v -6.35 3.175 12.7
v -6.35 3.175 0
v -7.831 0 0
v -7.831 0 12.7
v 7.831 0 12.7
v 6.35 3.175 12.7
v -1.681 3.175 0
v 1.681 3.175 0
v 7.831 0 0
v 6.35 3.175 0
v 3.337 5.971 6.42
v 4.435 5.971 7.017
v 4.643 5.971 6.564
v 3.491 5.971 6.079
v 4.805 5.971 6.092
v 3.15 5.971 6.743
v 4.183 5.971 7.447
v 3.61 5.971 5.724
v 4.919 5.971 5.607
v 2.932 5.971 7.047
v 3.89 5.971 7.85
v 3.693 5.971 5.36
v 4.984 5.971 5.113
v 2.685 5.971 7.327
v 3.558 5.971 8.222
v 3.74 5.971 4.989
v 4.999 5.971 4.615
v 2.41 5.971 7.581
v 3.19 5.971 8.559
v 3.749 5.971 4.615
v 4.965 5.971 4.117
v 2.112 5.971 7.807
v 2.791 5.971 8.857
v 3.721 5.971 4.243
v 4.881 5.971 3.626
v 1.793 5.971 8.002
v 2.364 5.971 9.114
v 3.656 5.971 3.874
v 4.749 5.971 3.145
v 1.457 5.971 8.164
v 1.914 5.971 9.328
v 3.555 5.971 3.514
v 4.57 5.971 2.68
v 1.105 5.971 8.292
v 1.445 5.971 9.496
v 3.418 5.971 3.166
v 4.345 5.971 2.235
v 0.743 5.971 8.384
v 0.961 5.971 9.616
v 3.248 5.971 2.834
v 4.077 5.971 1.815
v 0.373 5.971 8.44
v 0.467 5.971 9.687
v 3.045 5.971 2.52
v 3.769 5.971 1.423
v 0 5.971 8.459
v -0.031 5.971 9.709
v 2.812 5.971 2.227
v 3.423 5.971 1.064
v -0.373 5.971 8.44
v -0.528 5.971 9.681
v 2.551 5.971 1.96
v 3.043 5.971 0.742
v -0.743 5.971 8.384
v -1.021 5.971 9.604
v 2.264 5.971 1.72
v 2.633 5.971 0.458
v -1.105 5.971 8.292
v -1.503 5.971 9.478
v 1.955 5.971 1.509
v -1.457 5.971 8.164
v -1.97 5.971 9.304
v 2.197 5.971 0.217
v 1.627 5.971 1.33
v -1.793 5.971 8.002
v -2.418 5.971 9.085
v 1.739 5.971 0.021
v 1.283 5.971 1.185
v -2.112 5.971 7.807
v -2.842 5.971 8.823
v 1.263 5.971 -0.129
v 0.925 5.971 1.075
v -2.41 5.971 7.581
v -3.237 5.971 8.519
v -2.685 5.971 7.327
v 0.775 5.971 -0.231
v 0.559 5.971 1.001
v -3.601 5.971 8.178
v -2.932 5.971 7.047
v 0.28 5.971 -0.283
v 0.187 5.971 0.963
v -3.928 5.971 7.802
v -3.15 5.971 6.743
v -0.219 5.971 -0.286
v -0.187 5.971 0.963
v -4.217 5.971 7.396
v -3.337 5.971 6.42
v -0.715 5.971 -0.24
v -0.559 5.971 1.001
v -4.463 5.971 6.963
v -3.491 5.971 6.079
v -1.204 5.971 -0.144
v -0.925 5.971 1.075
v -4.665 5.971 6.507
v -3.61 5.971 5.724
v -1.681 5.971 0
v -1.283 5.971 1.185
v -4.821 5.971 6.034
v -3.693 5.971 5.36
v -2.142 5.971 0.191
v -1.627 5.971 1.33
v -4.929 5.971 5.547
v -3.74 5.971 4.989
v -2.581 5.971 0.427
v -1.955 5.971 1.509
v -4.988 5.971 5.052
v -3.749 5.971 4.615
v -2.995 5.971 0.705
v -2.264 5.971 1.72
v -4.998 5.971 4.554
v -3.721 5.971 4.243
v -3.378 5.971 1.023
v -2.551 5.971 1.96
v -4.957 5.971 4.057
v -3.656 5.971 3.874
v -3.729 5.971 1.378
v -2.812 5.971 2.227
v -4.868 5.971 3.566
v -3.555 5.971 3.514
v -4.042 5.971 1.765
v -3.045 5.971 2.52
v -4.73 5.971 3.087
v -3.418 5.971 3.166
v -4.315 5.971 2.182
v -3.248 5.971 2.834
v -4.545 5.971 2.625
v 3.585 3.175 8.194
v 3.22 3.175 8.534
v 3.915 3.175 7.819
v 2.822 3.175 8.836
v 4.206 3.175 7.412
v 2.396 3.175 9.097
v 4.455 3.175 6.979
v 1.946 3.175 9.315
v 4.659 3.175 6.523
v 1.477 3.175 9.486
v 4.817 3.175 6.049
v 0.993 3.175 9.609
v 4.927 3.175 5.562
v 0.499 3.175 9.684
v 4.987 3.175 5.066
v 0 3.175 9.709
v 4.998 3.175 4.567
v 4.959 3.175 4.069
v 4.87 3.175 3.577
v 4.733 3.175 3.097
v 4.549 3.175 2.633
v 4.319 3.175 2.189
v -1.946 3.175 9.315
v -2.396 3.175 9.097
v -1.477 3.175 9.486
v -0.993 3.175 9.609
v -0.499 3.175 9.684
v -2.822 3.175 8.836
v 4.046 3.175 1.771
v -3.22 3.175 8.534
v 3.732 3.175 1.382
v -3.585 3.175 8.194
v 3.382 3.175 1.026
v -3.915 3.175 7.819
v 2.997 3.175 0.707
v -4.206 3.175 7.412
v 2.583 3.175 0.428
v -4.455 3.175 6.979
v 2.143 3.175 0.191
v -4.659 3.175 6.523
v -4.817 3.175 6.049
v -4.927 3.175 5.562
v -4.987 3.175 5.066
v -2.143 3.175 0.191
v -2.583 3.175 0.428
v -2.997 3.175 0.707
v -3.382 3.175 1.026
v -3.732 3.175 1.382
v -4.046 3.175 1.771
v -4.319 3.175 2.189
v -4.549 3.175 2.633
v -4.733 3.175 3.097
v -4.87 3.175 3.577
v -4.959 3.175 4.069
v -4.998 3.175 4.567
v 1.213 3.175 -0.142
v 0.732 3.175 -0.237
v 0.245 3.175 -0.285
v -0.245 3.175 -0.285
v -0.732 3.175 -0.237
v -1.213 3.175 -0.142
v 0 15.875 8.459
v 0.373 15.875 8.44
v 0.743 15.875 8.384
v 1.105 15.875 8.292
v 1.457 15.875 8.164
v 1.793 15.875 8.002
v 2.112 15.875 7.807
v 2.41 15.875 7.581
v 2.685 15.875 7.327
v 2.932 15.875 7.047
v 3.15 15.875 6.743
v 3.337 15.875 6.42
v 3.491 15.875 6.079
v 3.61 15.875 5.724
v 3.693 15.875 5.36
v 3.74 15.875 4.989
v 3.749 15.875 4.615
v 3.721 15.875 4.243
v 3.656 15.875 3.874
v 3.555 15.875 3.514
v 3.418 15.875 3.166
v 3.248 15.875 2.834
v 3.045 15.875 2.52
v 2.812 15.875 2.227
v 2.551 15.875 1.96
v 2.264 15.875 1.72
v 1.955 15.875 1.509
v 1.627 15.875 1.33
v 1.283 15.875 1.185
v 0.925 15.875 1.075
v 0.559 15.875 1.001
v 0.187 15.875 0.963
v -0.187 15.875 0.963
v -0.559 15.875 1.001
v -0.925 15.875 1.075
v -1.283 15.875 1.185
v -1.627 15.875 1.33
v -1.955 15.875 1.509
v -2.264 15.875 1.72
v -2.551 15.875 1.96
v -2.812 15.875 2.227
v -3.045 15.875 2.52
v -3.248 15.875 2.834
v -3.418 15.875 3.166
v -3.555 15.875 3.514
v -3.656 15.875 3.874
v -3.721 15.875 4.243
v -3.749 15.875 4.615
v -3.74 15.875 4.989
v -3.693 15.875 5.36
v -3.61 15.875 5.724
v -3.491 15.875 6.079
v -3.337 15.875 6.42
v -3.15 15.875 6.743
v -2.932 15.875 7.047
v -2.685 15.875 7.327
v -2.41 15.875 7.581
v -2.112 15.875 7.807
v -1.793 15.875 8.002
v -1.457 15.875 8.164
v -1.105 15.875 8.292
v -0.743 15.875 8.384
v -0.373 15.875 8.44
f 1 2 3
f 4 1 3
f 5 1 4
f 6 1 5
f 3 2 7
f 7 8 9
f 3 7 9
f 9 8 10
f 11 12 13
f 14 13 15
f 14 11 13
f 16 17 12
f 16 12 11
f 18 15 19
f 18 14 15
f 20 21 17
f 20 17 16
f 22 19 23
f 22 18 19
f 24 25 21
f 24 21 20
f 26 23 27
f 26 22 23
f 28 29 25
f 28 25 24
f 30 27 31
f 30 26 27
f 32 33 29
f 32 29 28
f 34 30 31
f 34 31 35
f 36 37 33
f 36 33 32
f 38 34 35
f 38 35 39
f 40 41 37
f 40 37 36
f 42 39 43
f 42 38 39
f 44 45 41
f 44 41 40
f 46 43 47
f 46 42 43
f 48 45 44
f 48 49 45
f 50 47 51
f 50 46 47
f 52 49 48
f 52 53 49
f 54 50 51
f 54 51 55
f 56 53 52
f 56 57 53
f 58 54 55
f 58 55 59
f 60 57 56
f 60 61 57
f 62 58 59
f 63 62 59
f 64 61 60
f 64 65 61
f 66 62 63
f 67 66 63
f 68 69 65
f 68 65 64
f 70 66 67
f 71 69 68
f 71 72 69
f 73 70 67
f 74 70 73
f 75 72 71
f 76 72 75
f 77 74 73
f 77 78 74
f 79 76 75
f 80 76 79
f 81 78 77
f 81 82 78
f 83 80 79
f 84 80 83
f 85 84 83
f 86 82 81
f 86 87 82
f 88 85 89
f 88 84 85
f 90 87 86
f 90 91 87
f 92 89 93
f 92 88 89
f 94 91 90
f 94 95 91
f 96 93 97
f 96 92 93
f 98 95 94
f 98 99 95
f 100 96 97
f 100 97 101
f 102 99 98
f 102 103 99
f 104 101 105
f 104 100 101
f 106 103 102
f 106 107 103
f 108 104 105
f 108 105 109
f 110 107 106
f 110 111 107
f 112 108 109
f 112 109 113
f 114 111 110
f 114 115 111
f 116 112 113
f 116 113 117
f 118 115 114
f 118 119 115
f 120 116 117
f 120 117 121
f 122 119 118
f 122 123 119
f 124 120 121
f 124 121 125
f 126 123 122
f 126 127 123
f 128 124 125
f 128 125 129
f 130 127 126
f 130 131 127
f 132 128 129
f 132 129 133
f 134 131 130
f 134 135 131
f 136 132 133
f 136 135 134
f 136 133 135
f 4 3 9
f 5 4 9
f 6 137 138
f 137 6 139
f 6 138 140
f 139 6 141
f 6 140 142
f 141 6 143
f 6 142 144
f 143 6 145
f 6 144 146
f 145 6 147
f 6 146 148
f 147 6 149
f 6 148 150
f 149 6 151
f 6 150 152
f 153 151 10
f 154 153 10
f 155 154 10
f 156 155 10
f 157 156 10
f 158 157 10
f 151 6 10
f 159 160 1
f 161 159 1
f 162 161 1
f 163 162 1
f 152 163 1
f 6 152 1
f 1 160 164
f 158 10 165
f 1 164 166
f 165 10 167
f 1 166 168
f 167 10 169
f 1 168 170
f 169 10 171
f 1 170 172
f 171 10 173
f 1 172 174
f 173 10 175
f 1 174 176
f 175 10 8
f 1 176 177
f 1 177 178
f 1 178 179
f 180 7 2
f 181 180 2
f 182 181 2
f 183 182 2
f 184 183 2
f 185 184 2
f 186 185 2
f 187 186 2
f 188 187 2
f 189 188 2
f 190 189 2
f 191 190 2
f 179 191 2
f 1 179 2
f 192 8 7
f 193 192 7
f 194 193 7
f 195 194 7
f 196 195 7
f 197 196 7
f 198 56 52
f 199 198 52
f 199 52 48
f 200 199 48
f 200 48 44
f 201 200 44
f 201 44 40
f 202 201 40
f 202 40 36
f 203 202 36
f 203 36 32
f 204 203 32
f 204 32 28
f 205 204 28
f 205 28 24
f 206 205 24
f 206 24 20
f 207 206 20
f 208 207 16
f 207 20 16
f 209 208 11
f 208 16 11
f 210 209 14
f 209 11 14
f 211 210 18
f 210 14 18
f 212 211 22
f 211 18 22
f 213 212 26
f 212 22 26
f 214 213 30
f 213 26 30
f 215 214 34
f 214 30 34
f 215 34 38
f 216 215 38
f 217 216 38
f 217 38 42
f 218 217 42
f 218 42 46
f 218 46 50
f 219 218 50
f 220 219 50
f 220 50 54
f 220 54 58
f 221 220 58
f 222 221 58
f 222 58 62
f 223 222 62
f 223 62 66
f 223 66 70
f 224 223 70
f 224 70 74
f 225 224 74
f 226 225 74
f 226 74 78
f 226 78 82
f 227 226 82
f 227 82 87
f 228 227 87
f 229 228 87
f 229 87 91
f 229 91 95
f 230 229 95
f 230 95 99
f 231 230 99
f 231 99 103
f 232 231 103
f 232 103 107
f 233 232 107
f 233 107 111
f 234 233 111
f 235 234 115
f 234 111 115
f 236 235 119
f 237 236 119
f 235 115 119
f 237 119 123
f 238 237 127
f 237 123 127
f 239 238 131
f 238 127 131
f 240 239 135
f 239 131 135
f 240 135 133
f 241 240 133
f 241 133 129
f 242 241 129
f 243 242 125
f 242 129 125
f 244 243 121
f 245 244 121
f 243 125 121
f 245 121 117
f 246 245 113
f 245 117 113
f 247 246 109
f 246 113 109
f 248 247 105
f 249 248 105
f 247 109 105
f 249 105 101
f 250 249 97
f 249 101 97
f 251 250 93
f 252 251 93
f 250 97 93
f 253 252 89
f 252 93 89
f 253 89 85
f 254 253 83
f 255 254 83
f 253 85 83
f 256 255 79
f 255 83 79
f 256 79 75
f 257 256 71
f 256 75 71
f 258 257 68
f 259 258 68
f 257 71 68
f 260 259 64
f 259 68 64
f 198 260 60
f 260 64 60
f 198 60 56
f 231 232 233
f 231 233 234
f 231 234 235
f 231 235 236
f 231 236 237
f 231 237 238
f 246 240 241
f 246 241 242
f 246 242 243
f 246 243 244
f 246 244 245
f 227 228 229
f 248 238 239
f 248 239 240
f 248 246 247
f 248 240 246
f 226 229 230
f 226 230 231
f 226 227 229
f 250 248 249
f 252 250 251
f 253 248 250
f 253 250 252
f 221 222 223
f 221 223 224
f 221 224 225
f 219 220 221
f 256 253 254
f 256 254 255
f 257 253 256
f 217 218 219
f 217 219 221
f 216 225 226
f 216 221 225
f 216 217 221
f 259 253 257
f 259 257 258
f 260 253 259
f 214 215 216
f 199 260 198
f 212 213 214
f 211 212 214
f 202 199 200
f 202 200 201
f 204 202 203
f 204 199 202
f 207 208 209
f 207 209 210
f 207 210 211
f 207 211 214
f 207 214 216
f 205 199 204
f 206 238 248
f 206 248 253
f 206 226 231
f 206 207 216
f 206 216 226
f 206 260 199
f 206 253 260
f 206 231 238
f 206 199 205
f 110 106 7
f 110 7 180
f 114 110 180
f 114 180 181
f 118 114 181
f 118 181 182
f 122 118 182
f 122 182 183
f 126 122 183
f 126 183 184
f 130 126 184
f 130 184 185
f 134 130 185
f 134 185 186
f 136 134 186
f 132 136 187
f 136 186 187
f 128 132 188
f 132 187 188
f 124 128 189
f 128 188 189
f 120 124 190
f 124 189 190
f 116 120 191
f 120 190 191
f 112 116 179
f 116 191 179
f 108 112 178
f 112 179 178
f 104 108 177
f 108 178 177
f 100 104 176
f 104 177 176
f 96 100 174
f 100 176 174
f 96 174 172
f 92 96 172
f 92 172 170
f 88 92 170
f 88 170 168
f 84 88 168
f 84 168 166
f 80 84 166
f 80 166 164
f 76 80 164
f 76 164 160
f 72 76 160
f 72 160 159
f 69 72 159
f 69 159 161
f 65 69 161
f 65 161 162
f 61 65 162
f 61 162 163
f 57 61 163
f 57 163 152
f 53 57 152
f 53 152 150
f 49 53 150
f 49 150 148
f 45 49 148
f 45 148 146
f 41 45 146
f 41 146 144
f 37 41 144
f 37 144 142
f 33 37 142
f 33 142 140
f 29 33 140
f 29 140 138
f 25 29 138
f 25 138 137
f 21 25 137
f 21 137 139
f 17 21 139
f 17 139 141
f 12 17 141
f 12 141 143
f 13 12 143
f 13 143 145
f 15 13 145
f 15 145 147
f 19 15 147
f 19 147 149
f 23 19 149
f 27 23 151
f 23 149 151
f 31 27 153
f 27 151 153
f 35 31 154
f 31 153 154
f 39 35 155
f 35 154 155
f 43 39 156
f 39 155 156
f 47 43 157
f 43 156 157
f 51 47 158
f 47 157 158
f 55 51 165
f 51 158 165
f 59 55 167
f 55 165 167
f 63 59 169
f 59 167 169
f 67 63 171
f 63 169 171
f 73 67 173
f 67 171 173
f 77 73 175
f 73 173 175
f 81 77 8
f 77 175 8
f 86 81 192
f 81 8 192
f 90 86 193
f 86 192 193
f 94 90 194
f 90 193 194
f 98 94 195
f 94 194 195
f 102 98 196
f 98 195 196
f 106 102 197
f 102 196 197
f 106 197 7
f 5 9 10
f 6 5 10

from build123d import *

# Parameters (mm, degrees)
BOSS_EXTRUDE1_DEPTH = 12.7
SKETCH2_R           = 3.75
BOSS_EXTRUDE2_DEPTH = 12.7
SKETCH3_R           = 5
BOSS_EXTRUDE3_DEPTH = 2.796


with BuildPart() as part:
    # Sketch1 → Boss-Extrude1 (new body)
    with BuildSketch(Plane.XY):
        Polygon((-7.830526815, 0), (7.830526815, 0), (6.35, 3.175), (-6.35, 3.175), align=None)
    extrude(amount=BOSS_EXTRUDE1_DEPTH)

    # Sketch2 → Boss-Extrude2 (add)
    with BuildSketch(Plane(origin=(0, 3.175, 0), x_dir=(1, 0, 0), z_dir=(0, 1, 0))):
        with Locations(Location((0, -4.708818534, 0), (0, 0, 270))):
            Circle(SKETCH2_R)
    extrude(amount=BOSS_EXTRUDE2_DEPTH)

    # Sketch3 → Boss-Extrude3 (add)
    with BuildSketch(Plane(origin=(0, 3.175, 0), x_dir=(1, 0, 0), z_dir=(0, 1, 0))):
        with Locations(Location((0, -4.708818534, 0), (0, 0, 109.650110836))):
            Circle(SKETCH3_R)
    extrude(amount=BOSS_EXTRUDE3_DEPTH)


solid = part.part
